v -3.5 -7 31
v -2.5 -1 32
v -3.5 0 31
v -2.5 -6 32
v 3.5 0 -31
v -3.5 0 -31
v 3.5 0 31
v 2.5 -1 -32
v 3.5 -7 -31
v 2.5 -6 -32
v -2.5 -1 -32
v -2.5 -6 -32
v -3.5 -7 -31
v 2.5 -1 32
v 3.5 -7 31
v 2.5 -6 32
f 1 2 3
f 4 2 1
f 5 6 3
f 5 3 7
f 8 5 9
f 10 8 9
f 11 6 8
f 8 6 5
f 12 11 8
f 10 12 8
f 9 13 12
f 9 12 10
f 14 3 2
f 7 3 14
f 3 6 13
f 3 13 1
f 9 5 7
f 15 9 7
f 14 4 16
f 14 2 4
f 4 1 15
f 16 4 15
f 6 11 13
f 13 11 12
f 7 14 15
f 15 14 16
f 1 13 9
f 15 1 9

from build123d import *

# Parameters (mm, degrees)
F0_W     = 7
F0_H     = 64
F1_DEPTH = 7
F2_SIZE  = 1


with BuildPart() as f1:
    # F0 (on Front) → F1 (new body)
    with BuildSketch(Plane.XZ):
        Rectangle(F0_W, F0_H)
    extrude(amount=F1_DEPTH)

    # F2
    f2_edges = [f1.edges().sort_by_distance(p)[0] for p in [
        (0, -7, 32),
        (3.5, -3.5, 32),
        (0, 0, 32),
        (-3.5, -3.5, 32),
        (3.5, -3.5, -32),
        (0, -7, -32),
        (-3.5, -3.5, -32),
        (0, 0, -32),
    ]]
    chamfer(f2_edges, length=F2_SIZE)


solid = f1.part
